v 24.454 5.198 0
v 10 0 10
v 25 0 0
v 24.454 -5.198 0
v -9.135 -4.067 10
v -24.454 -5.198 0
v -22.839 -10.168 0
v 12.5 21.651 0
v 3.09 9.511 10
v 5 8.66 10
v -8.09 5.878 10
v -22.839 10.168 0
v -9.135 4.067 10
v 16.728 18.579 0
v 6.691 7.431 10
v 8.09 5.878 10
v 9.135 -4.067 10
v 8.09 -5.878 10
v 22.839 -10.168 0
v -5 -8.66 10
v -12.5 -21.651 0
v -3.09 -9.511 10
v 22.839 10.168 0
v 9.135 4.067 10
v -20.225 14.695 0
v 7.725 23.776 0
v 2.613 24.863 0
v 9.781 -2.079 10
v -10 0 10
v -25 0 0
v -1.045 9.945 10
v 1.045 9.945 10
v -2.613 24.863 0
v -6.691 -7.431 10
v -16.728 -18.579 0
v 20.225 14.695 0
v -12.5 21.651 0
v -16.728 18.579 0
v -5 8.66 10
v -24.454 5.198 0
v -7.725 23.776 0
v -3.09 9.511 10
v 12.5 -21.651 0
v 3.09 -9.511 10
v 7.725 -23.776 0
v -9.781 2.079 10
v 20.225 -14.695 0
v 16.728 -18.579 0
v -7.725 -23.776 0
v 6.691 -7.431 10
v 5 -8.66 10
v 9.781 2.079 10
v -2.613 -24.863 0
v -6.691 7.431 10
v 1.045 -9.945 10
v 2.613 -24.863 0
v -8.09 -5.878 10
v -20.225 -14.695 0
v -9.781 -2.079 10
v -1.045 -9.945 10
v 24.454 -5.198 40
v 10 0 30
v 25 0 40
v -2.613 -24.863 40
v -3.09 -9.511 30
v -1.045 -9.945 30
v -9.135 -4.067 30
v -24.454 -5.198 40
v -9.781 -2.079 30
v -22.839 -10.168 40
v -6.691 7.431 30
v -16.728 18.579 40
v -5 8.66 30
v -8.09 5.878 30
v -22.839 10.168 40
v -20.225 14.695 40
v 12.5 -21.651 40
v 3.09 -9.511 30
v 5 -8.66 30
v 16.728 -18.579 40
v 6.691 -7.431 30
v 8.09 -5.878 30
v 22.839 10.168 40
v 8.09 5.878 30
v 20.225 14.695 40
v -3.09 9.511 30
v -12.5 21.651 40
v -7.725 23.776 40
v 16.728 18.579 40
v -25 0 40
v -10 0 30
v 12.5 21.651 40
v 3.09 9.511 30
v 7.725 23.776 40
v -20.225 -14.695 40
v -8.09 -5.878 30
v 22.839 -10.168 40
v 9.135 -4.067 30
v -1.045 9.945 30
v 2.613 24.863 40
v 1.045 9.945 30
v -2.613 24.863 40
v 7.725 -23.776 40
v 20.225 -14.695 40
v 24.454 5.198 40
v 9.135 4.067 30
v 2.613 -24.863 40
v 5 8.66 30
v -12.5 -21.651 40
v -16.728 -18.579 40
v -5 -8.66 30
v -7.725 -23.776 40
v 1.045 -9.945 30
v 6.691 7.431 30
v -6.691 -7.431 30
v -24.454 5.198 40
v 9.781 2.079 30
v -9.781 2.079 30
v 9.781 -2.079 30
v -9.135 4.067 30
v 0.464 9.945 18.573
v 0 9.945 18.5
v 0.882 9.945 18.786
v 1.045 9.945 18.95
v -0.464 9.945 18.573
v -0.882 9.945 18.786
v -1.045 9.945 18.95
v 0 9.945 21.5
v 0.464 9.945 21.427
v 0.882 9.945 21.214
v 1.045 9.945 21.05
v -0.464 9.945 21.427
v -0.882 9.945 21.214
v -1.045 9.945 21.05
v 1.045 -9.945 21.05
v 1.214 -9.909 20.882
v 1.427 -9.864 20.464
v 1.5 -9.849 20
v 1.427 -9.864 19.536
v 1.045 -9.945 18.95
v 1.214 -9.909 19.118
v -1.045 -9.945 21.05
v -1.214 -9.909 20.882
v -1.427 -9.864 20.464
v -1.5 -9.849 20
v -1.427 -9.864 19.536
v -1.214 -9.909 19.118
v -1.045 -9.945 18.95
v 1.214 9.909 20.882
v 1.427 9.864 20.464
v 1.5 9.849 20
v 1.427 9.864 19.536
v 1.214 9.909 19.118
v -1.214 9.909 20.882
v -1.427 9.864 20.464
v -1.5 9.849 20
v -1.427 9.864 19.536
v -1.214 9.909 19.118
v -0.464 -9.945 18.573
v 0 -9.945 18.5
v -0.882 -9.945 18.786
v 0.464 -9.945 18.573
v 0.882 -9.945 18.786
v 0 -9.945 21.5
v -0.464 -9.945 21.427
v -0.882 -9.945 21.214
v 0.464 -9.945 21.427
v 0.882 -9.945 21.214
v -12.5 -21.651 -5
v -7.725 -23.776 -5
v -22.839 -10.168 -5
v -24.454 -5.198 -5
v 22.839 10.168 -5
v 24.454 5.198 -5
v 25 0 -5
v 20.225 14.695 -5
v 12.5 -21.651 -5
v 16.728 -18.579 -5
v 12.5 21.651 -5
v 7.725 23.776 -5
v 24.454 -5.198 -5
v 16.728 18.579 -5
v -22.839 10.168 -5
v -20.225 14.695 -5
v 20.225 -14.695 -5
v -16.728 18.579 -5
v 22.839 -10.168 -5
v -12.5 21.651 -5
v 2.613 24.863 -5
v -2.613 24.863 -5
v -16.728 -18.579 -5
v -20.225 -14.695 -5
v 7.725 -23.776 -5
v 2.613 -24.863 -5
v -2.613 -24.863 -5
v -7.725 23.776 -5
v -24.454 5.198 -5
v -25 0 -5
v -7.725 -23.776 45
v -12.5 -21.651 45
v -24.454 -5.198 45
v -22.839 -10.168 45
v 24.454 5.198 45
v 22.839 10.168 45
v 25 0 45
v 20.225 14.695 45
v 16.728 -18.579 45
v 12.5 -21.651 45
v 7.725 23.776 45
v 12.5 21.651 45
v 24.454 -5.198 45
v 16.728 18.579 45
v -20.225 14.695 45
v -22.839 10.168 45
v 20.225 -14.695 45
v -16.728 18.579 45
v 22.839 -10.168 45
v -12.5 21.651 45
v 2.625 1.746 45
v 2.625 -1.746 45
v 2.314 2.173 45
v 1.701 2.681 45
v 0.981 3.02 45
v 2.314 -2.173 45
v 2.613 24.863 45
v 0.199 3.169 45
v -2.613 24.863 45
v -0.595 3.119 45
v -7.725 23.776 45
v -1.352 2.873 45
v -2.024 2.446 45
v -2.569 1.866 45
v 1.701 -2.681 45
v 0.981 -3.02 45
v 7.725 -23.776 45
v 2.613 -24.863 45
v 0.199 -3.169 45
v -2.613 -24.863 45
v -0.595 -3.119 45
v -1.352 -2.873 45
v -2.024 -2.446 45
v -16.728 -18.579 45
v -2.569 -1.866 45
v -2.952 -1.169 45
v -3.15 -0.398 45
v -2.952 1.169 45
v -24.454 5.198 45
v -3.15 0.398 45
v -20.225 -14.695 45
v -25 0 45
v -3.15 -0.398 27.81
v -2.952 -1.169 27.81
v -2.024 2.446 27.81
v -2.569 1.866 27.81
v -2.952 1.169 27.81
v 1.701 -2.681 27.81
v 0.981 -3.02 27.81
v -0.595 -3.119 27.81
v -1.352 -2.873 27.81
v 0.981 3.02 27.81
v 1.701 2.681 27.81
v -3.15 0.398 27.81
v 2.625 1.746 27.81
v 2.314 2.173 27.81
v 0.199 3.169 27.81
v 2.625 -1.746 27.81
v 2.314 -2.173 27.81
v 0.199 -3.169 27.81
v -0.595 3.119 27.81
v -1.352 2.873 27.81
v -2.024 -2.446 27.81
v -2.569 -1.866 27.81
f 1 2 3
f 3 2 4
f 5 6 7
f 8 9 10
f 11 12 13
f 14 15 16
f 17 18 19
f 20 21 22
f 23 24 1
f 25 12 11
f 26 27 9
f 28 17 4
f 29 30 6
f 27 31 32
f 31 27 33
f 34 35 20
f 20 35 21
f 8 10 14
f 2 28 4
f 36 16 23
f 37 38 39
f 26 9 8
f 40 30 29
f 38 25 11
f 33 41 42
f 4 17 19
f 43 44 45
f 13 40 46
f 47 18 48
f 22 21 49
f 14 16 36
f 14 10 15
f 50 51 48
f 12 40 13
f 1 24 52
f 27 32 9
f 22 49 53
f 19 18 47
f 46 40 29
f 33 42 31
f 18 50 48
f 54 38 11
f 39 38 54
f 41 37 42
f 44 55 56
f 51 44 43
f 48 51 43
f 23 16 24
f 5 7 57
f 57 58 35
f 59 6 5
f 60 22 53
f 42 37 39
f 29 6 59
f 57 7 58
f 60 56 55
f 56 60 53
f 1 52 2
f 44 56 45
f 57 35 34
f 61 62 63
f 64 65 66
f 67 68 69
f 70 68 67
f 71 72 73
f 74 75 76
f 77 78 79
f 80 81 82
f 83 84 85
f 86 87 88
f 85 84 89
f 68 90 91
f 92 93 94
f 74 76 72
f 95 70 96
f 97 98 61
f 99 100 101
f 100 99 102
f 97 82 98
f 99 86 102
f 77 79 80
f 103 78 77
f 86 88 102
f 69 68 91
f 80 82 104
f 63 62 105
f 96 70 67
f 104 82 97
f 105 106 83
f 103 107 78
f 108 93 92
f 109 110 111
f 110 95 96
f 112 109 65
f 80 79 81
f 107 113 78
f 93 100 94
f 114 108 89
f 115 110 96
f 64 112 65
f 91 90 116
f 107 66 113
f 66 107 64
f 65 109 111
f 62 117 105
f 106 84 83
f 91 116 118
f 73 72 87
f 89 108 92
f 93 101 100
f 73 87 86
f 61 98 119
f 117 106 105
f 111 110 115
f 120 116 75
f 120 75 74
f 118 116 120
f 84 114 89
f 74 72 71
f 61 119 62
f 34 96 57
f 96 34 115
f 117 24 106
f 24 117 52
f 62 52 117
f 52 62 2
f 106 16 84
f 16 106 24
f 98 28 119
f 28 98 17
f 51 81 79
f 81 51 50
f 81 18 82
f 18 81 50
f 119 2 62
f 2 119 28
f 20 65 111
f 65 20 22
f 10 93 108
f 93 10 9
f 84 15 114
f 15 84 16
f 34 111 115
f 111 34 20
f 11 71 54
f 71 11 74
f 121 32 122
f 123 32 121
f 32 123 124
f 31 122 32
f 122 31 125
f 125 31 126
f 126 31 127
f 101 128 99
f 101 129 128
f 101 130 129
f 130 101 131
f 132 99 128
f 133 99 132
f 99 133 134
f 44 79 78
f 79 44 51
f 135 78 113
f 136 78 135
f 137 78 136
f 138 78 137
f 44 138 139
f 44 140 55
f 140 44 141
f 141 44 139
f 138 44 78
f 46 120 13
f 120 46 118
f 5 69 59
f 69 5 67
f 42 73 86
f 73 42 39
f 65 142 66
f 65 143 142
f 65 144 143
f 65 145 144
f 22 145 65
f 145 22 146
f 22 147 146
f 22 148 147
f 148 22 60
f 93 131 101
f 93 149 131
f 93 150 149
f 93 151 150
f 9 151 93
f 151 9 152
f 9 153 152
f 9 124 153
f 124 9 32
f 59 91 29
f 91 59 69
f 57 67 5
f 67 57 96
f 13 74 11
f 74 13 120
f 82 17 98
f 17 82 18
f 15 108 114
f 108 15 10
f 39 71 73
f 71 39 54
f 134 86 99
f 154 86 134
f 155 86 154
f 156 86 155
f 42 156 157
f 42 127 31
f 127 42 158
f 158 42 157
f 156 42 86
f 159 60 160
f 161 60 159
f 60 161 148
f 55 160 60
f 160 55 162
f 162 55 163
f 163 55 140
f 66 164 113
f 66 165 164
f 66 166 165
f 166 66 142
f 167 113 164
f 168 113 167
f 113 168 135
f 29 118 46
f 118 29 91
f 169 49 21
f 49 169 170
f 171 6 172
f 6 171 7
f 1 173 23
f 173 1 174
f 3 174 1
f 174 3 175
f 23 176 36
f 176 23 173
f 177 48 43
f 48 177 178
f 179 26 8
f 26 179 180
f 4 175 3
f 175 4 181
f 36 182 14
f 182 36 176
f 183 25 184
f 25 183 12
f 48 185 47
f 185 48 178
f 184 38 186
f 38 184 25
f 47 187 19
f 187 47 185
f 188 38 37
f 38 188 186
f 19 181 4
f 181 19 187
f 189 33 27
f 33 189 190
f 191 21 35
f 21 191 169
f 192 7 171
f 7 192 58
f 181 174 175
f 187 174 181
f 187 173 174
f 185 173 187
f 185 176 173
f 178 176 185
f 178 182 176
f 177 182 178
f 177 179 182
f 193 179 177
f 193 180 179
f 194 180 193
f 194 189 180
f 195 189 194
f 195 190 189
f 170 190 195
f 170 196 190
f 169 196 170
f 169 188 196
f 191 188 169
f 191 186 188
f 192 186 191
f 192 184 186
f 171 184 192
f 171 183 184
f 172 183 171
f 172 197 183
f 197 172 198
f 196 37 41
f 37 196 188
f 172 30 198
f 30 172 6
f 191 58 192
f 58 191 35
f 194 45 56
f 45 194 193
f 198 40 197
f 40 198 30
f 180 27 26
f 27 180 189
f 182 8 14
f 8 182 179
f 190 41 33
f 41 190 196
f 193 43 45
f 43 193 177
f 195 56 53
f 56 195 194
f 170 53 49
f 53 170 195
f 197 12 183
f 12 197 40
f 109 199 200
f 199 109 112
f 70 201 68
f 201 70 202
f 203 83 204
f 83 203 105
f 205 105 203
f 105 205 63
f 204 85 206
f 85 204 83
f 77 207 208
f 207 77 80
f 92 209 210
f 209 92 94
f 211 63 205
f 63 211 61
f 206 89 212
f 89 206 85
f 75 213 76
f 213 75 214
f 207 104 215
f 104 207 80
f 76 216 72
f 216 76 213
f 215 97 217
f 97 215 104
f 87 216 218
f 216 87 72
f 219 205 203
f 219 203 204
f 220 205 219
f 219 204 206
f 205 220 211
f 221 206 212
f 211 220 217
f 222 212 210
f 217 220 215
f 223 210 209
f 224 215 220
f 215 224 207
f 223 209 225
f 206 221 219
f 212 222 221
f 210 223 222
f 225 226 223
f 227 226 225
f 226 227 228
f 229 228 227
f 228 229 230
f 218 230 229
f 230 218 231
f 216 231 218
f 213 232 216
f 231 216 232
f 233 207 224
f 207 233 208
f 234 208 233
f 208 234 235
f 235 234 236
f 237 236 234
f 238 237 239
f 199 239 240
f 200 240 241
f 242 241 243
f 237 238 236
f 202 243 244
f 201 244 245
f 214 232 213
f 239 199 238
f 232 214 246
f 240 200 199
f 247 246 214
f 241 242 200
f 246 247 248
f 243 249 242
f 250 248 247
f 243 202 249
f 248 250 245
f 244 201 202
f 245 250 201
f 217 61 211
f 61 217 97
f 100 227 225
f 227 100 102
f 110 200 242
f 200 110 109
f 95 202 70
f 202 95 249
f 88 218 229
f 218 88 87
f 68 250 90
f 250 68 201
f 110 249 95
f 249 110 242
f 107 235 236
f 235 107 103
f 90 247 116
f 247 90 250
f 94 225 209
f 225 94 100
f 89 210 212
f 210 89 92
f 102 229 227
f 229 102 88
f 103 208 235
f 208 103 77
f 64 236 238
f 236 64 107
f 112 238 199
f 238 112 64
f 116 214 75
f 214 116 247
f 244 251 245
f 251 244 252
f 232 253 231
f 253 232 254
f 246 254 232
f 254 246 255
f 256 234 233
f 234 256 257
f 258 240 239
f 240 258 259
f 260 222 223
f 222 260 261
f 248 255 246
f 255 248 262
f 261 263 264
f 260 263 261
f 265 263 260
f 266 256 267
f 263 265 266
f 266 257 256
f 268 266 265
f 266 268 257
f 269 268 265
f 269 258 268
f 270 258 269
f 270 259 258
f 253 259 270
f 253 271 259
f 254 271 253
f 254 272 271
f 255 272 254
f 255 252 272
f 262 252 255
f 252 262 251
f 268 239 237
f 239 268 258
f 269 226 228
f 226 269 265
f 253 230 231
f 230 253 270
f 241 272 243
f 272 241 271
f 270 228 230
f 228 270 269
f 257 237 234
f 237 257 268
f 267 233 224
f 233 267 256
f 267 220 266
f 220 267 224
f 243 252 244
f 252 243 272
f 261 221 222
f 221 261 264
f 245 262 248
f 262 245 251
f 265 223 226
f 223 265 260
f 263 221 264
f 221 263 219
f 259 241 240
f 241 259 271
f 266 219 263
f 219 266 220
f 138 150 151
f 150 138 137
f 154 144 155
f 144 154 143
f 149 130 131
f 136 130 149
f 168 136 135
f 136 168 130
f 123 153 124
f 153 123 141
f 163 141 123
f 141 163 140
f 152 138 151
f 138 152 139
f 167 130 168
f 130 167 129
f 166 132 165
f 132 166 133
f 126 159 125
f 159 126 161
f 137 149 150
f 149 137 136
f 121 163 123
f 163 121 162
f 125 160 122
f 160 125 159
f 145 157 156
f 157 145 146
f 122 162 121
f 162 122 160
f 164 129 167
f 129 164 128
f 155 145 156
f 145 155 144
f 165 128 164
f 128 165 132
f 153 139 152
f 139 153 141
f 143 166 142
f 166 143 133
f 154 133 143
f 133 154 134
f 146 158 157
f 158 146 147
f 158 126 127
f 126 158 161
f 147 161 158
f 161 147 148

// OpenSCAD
inner_height = 40;
spindle_dia = 20;
walls_dia = 50;
walls_height = 5;
tie_hole_dia = 3;
bevel_height = 10;
shaft_dia = 6.35;
shaft_flat_dia = 5.8;
shaft_height = 17.2;


difference () {
 spindle();
 translate([0, (spindle_dia+2)/2, inner_height/2])
  rotate(a=90, v=[1, 0, 0])
   cylinder(h=spindle_dia+2, r=tie_hole_dia/2, $fn=20);

 translate([0, 0, inner_height+walls_height-shaft_height+0.01])
  d_shaft(shaft_dia, shaft_flat_dia, shaft_height);
}

module d_shaft(d, flat_d, h) {
 difference() {
  cylinder($fn=25, h=h, r=d/2);
  translate([d/2-(d-flat_d), -(d+2)/2, -1])
   cube([d, d+2, h+2]);
 }
}

module spindle() {
 cylinder(r1=walls_dia/2, r2=spindle_dia/2, h=bevel_height);

 translate([0, 0, inner_height])
  rotate(a=180, v=[1, 0, 0])
   cylinder(r1=walls_dia/2, r2=spindle_dia/2, h=bevel_height);

 cylinder(h=inner_height, r=spindle_dia/2);
 
 translate([0, 0, -walls_height])
  cylinder(h=walls_height, r=walls_dia/2);
 
 translate([0, 0, inner_height])
  cylinder(h=walls_height, r=walls_dia/2);
}
